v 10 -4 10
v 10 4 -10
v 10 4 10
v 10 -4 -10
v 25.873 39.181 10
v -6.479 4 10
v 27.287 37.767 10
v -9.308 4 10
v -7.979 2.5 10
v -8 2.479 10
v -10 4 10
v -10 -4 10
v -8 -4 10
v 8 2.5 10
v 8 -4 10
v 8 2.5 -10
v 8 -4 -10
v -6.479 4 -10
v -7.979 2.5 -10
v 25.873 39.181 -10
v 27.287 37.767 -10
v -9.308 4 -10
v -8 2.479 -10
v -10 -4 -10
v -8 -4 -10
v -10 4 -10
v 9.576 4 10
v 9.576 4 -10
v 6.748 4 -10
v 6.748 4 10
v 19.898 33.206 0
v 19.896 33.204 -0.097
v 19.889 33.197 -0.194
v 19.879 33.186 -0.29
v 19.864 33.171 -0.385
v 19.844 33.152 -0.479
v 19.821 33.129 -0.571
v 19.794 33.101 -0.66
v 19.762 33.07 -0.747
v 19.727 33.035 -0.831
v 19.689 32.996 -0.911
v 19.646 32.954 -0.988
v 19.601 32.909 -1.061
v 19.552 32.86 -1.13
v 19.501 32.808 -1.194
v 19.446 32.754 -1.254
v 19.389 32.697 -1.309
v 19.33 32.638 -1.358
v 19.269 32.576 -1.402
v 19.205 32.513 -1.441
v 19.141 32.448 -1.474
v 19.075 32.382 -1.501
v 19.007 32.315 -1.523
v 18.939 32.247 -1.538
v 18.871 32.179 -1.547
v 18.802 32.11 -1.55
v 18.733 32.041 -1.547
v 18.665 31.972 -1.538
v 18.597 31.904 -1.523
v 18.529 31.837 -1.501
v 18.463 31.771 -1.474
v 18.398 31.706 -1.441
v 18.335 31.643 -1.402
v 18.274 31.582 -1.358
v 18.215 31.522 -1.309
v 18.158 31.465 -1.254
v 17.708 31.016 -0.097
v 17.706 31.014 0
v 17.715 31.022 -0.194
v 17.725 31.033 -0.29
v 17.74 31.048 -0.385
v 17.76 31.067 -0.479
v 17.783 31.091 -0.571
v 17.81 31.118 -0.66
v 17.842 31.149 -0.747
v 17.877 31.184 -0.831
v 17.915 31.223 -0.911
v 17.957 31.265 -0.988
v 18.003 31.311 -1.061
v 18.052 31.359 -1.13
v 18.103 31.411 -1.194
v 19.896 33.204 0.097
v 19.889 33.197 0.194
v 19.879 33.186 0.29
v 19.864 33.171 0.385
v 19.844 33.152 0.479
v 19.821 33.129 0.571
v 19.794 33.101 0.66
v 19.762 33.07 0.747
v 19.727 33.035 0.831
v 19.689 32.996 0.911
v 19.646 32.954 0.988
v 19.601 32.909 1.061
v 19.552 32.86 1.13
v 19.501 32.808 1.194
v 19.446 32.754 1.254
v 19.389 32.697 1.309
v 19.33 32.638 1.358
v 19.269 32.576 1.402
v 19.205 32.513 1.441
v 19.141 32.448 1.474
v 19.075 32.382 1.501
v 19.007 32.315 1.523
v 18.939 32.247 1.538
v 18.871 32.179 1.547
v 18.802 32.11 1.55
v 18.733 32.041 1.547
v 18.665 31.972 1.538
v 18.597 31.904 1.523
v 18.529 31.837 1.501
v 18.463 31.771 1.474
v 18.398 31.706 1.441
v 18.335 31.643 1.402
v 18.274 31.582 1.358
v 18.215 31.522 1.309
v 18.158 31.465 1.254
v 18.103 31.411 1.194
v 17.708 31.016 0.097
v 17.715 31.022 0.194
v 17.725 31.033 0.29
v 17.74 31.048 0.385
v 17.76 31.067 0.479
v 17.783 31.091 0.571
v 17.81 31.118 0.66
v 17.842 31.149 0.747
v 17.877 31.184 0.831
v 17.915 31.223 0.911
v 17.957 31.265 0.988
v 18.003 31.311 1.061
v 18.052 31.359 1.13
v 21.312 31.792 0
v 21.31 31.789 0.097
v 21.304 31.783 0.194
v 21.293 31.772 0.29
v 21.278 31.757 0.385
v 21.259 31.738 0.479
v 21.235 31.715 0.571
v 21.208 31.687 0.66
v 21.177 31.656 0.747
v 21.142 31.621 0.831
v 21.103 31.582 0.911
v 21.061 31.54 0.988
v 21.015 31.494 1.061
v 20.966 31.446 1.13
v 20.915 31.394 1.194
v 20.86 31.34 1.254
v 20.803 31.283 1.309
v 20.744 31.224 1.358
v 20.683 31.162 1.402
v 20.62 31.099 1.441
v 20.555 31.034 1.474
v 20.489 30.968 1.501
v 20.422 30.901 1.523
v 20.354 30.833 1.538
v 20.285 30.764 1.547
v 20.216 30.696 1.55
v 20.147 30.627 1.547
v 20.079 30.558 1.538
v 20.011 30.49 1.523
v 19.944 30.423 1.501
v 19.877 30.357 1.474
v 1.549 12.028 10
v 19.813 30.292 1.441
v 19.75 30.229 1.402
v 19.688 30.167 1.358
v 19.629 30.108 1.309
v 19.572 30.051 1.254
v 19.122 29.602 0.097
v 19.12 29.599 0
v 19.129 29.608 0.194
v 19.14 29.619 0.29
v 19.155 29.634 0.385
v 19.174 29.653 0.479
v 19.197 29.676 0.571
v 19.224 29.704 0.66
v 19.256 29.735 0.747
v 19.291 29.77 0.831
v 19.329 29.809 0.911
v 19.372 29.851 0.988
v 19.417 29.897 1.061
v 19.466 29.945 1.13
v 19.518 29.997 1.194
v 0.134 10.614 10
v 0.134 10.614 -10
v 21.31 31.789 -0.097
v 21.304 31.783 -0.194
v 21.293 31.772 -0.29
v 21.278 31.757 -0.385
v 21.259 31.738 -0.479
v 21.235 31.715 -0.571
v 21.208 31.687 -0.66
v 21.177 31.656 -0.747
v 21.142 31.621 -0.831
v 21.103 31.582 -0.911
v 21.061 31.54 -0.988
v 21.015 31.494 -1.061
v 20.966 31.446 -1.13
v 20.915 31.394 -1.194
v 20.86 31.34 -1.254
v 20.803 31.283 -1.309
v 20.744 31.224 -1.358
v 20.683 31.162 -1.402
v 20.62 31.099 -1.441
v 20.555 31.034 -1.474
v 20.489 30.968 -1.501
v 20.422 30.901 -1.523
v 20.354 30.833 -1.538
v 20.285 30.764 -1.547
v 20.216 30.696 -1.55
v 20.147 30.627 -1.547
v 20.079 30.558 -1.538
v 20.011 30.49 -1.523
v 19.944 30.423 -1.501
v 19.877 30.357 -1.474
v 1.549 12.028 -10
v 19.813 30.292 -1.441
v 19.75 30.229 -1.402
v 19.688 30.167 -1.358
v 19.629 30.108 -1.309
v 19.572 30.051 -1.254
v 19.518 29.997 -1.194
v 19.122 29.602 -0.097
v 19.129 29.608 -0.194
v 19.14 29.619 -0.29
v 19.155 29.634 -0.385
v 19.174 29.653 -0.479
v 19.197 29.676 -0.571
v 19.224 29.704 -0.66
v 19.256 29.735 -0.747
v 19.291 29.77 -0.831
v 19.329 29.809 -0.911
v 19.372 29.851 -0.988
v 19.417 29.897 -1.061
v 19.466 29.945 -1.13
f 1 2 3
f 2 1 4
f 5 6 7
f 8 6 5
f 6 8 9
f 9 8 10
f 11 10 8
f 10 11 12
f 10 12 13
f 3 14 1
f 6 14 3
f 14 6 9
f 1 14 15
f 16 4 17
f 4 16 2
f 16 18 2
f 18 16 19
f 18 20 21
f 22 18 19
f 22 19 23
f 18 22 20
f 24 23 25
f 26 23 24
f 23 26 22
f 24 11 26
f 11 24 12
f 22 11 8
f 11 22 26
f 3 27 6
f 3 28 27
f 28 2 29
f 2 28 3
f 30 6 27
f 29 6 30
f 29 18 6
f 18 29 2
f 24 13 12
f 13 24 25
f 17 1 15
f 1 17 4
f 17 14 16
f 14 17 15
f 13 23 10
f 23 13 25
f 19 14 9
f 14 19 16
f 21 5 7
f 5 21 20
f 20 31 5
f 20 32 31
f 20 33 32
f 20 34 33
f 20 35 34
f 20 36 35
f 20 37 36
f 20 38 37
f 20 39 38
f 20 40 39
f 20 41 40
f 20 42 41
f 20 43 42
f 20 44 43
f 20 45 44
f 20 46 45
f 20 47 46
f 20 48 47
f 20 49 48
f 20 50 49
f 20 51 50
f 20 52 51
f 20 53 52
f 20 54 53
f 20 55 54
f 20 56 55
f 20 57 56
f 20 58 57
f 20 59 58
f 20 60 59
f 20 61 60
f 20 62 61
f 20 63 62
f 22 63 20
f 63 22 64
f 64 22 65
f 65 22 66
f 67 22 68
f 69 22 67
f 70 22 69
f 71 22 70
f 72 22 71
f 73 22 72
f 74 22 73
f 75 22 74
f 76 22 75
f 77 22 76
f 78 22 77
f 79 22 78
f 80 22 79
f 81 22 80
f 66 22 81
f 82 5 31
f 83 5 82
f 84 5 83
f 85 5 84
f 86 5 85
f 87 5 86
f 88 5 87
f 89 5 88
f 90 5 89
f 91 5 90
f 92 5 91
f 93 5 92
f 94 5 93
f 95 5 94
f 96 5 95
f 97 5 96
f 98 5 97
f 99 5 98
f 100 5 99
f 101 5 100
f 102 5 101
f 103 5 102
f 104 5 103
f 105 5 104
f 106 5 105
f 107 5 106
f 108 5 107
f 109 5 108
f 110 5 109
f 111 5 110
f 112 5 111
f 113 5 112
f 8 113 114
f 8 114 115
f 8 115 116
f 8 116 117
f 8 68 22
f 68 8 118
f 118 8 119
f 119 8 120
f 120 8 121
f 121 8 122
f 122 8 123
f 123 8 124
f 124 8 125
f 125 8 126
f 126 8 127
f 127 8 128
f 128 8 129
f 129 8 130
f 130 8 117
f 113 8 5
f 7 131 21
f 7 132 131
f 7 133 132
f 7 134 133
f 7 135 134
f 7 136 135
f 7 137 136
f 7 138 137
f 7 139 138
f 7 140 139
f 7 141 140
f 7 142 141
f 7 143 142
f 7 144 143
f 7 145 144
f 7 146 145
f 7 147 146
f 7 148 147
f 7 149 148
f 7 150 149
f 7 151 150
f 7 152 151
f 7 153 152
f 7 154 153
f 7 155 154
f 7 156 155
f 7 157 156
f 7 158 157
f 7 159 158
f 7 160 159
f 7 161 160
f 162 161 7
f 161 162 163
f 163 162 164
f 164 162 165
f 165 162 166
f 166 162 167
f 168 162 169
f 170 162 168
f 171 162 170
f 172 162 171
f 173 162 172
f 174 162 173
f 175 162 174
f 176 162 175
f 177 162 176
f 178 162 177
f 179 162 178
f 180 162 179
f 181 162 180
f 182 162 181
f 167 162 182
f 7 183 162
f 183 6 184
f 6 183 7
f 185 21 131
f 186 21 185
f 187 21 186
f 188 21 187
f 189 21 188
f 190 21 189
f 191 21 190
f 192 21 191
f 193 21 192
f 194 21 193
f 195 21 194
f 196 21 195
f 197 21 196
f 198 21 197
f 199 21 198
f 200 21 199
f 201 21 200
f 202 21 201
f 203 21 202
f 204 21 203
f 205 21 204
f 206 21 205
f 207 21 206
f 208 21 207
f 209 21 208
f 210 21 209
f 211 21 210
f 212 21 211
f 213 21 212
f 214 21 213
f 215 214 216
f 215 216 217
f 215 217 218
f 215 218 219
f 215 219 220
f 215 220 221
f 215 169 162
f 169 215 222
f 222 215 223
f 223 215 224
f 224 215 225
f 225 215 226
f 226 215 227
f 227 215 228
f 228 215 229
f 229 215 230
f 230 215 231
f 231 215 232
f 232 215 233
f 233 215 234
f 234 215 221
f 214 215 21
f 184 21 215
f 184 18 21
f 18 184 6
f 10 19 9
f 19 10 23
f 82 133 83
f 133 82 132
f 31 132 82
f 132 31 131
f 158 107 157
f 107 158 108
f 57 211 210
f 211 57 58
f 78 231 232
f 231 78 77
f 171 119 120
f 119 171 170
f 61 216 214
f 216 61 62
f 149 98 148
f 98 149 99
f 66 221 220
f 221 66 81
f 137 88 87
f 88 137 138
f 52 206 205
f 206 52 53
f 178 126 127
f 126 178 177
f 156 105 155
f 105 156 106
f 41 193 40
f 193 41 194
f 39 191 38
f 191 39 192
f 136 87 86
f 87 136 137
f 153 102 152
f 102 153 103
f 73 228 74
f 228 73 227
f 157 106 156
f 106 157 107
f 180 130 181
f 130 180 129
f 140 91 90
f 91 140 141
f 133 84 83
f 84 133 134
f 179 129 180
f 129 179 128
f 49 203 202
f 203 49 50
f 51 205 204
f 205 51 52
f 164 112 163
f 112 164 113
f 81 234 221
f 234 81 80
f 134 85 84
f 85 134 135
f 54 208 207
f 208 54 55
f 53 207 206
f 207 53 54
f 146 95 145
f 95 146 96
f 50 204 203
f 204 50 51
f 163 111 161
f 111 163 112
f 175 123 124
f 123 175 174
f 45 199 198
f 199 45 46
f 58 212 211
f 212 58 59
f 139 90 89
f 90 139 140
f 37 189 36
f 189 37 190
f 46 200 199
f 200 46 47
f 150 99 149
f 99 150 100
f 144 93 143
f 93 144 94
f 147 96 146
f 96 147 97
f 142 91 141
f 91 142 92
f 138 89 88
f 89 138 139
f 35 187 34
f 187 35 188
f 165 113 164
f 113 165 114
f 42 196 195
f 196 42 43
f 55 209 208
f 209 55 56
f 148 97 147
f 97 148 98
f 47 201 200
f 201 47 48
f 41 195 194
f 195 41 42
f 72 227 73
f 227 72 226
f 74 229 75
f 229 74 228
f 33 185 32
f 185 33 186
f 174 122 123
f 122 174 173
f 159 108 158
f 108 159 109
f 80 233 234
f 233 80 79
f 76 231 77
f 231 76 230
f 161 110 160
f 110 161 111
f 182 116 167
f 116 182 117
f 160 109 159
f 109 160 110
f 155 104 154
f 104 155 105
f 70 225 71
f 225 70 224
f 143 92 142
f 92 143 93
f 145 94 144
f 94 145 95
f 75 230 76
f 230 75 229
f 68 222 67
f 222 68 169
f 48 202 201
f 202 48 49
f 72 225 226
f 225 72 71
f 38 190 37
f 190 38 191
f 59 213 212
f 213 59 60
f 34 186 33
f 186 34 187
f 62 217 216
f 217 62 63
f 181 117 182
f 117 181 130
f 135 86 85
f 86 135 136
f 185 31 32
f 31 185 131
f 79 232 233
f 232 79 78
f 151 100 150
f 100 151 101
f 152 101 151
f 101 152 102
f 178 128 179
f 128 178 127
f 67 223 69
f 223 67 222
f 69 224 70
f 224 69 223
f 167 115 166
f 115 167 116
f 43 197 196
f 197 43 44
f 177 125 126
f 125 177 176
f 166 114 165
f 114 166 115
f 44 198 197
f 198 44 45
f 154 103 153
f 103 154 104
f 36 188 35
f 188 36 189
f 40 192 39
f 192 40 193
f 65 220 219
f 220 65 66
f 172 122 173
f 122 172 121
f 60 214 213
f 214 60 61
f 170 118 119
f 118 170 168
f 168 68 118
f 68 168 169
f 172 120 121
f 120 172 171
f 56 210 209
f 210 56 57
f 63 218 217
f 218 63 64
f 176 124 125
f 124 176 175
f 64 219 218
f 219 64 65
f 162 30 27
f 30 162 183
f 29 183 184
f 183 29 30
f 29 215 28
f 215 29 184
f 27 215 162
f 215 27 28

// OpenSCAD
    union() {
        union() {
            difference(){
                color("blue") cube ([20, 8, 20], center=true);
                color("red") translate ([0, -1, 0]) cube ([16, 7, 200], center=true);
            }
        }

        color("pink")
            rotate(a=45)
                translate([-4, 7.41, -10]) difference() {
                    cube ([50, 2, 20]);
                    translate([40, 0, 10]) rotate([90, 0, 0]) cylinder (h = 10, r = 1.55, $fn = 100, center=true);
                }

        color("orange") 
            rotate(a=135) 
                translate([-4, -9.6, -10]) 
                    cube ([12, 2, 20]);
    }
